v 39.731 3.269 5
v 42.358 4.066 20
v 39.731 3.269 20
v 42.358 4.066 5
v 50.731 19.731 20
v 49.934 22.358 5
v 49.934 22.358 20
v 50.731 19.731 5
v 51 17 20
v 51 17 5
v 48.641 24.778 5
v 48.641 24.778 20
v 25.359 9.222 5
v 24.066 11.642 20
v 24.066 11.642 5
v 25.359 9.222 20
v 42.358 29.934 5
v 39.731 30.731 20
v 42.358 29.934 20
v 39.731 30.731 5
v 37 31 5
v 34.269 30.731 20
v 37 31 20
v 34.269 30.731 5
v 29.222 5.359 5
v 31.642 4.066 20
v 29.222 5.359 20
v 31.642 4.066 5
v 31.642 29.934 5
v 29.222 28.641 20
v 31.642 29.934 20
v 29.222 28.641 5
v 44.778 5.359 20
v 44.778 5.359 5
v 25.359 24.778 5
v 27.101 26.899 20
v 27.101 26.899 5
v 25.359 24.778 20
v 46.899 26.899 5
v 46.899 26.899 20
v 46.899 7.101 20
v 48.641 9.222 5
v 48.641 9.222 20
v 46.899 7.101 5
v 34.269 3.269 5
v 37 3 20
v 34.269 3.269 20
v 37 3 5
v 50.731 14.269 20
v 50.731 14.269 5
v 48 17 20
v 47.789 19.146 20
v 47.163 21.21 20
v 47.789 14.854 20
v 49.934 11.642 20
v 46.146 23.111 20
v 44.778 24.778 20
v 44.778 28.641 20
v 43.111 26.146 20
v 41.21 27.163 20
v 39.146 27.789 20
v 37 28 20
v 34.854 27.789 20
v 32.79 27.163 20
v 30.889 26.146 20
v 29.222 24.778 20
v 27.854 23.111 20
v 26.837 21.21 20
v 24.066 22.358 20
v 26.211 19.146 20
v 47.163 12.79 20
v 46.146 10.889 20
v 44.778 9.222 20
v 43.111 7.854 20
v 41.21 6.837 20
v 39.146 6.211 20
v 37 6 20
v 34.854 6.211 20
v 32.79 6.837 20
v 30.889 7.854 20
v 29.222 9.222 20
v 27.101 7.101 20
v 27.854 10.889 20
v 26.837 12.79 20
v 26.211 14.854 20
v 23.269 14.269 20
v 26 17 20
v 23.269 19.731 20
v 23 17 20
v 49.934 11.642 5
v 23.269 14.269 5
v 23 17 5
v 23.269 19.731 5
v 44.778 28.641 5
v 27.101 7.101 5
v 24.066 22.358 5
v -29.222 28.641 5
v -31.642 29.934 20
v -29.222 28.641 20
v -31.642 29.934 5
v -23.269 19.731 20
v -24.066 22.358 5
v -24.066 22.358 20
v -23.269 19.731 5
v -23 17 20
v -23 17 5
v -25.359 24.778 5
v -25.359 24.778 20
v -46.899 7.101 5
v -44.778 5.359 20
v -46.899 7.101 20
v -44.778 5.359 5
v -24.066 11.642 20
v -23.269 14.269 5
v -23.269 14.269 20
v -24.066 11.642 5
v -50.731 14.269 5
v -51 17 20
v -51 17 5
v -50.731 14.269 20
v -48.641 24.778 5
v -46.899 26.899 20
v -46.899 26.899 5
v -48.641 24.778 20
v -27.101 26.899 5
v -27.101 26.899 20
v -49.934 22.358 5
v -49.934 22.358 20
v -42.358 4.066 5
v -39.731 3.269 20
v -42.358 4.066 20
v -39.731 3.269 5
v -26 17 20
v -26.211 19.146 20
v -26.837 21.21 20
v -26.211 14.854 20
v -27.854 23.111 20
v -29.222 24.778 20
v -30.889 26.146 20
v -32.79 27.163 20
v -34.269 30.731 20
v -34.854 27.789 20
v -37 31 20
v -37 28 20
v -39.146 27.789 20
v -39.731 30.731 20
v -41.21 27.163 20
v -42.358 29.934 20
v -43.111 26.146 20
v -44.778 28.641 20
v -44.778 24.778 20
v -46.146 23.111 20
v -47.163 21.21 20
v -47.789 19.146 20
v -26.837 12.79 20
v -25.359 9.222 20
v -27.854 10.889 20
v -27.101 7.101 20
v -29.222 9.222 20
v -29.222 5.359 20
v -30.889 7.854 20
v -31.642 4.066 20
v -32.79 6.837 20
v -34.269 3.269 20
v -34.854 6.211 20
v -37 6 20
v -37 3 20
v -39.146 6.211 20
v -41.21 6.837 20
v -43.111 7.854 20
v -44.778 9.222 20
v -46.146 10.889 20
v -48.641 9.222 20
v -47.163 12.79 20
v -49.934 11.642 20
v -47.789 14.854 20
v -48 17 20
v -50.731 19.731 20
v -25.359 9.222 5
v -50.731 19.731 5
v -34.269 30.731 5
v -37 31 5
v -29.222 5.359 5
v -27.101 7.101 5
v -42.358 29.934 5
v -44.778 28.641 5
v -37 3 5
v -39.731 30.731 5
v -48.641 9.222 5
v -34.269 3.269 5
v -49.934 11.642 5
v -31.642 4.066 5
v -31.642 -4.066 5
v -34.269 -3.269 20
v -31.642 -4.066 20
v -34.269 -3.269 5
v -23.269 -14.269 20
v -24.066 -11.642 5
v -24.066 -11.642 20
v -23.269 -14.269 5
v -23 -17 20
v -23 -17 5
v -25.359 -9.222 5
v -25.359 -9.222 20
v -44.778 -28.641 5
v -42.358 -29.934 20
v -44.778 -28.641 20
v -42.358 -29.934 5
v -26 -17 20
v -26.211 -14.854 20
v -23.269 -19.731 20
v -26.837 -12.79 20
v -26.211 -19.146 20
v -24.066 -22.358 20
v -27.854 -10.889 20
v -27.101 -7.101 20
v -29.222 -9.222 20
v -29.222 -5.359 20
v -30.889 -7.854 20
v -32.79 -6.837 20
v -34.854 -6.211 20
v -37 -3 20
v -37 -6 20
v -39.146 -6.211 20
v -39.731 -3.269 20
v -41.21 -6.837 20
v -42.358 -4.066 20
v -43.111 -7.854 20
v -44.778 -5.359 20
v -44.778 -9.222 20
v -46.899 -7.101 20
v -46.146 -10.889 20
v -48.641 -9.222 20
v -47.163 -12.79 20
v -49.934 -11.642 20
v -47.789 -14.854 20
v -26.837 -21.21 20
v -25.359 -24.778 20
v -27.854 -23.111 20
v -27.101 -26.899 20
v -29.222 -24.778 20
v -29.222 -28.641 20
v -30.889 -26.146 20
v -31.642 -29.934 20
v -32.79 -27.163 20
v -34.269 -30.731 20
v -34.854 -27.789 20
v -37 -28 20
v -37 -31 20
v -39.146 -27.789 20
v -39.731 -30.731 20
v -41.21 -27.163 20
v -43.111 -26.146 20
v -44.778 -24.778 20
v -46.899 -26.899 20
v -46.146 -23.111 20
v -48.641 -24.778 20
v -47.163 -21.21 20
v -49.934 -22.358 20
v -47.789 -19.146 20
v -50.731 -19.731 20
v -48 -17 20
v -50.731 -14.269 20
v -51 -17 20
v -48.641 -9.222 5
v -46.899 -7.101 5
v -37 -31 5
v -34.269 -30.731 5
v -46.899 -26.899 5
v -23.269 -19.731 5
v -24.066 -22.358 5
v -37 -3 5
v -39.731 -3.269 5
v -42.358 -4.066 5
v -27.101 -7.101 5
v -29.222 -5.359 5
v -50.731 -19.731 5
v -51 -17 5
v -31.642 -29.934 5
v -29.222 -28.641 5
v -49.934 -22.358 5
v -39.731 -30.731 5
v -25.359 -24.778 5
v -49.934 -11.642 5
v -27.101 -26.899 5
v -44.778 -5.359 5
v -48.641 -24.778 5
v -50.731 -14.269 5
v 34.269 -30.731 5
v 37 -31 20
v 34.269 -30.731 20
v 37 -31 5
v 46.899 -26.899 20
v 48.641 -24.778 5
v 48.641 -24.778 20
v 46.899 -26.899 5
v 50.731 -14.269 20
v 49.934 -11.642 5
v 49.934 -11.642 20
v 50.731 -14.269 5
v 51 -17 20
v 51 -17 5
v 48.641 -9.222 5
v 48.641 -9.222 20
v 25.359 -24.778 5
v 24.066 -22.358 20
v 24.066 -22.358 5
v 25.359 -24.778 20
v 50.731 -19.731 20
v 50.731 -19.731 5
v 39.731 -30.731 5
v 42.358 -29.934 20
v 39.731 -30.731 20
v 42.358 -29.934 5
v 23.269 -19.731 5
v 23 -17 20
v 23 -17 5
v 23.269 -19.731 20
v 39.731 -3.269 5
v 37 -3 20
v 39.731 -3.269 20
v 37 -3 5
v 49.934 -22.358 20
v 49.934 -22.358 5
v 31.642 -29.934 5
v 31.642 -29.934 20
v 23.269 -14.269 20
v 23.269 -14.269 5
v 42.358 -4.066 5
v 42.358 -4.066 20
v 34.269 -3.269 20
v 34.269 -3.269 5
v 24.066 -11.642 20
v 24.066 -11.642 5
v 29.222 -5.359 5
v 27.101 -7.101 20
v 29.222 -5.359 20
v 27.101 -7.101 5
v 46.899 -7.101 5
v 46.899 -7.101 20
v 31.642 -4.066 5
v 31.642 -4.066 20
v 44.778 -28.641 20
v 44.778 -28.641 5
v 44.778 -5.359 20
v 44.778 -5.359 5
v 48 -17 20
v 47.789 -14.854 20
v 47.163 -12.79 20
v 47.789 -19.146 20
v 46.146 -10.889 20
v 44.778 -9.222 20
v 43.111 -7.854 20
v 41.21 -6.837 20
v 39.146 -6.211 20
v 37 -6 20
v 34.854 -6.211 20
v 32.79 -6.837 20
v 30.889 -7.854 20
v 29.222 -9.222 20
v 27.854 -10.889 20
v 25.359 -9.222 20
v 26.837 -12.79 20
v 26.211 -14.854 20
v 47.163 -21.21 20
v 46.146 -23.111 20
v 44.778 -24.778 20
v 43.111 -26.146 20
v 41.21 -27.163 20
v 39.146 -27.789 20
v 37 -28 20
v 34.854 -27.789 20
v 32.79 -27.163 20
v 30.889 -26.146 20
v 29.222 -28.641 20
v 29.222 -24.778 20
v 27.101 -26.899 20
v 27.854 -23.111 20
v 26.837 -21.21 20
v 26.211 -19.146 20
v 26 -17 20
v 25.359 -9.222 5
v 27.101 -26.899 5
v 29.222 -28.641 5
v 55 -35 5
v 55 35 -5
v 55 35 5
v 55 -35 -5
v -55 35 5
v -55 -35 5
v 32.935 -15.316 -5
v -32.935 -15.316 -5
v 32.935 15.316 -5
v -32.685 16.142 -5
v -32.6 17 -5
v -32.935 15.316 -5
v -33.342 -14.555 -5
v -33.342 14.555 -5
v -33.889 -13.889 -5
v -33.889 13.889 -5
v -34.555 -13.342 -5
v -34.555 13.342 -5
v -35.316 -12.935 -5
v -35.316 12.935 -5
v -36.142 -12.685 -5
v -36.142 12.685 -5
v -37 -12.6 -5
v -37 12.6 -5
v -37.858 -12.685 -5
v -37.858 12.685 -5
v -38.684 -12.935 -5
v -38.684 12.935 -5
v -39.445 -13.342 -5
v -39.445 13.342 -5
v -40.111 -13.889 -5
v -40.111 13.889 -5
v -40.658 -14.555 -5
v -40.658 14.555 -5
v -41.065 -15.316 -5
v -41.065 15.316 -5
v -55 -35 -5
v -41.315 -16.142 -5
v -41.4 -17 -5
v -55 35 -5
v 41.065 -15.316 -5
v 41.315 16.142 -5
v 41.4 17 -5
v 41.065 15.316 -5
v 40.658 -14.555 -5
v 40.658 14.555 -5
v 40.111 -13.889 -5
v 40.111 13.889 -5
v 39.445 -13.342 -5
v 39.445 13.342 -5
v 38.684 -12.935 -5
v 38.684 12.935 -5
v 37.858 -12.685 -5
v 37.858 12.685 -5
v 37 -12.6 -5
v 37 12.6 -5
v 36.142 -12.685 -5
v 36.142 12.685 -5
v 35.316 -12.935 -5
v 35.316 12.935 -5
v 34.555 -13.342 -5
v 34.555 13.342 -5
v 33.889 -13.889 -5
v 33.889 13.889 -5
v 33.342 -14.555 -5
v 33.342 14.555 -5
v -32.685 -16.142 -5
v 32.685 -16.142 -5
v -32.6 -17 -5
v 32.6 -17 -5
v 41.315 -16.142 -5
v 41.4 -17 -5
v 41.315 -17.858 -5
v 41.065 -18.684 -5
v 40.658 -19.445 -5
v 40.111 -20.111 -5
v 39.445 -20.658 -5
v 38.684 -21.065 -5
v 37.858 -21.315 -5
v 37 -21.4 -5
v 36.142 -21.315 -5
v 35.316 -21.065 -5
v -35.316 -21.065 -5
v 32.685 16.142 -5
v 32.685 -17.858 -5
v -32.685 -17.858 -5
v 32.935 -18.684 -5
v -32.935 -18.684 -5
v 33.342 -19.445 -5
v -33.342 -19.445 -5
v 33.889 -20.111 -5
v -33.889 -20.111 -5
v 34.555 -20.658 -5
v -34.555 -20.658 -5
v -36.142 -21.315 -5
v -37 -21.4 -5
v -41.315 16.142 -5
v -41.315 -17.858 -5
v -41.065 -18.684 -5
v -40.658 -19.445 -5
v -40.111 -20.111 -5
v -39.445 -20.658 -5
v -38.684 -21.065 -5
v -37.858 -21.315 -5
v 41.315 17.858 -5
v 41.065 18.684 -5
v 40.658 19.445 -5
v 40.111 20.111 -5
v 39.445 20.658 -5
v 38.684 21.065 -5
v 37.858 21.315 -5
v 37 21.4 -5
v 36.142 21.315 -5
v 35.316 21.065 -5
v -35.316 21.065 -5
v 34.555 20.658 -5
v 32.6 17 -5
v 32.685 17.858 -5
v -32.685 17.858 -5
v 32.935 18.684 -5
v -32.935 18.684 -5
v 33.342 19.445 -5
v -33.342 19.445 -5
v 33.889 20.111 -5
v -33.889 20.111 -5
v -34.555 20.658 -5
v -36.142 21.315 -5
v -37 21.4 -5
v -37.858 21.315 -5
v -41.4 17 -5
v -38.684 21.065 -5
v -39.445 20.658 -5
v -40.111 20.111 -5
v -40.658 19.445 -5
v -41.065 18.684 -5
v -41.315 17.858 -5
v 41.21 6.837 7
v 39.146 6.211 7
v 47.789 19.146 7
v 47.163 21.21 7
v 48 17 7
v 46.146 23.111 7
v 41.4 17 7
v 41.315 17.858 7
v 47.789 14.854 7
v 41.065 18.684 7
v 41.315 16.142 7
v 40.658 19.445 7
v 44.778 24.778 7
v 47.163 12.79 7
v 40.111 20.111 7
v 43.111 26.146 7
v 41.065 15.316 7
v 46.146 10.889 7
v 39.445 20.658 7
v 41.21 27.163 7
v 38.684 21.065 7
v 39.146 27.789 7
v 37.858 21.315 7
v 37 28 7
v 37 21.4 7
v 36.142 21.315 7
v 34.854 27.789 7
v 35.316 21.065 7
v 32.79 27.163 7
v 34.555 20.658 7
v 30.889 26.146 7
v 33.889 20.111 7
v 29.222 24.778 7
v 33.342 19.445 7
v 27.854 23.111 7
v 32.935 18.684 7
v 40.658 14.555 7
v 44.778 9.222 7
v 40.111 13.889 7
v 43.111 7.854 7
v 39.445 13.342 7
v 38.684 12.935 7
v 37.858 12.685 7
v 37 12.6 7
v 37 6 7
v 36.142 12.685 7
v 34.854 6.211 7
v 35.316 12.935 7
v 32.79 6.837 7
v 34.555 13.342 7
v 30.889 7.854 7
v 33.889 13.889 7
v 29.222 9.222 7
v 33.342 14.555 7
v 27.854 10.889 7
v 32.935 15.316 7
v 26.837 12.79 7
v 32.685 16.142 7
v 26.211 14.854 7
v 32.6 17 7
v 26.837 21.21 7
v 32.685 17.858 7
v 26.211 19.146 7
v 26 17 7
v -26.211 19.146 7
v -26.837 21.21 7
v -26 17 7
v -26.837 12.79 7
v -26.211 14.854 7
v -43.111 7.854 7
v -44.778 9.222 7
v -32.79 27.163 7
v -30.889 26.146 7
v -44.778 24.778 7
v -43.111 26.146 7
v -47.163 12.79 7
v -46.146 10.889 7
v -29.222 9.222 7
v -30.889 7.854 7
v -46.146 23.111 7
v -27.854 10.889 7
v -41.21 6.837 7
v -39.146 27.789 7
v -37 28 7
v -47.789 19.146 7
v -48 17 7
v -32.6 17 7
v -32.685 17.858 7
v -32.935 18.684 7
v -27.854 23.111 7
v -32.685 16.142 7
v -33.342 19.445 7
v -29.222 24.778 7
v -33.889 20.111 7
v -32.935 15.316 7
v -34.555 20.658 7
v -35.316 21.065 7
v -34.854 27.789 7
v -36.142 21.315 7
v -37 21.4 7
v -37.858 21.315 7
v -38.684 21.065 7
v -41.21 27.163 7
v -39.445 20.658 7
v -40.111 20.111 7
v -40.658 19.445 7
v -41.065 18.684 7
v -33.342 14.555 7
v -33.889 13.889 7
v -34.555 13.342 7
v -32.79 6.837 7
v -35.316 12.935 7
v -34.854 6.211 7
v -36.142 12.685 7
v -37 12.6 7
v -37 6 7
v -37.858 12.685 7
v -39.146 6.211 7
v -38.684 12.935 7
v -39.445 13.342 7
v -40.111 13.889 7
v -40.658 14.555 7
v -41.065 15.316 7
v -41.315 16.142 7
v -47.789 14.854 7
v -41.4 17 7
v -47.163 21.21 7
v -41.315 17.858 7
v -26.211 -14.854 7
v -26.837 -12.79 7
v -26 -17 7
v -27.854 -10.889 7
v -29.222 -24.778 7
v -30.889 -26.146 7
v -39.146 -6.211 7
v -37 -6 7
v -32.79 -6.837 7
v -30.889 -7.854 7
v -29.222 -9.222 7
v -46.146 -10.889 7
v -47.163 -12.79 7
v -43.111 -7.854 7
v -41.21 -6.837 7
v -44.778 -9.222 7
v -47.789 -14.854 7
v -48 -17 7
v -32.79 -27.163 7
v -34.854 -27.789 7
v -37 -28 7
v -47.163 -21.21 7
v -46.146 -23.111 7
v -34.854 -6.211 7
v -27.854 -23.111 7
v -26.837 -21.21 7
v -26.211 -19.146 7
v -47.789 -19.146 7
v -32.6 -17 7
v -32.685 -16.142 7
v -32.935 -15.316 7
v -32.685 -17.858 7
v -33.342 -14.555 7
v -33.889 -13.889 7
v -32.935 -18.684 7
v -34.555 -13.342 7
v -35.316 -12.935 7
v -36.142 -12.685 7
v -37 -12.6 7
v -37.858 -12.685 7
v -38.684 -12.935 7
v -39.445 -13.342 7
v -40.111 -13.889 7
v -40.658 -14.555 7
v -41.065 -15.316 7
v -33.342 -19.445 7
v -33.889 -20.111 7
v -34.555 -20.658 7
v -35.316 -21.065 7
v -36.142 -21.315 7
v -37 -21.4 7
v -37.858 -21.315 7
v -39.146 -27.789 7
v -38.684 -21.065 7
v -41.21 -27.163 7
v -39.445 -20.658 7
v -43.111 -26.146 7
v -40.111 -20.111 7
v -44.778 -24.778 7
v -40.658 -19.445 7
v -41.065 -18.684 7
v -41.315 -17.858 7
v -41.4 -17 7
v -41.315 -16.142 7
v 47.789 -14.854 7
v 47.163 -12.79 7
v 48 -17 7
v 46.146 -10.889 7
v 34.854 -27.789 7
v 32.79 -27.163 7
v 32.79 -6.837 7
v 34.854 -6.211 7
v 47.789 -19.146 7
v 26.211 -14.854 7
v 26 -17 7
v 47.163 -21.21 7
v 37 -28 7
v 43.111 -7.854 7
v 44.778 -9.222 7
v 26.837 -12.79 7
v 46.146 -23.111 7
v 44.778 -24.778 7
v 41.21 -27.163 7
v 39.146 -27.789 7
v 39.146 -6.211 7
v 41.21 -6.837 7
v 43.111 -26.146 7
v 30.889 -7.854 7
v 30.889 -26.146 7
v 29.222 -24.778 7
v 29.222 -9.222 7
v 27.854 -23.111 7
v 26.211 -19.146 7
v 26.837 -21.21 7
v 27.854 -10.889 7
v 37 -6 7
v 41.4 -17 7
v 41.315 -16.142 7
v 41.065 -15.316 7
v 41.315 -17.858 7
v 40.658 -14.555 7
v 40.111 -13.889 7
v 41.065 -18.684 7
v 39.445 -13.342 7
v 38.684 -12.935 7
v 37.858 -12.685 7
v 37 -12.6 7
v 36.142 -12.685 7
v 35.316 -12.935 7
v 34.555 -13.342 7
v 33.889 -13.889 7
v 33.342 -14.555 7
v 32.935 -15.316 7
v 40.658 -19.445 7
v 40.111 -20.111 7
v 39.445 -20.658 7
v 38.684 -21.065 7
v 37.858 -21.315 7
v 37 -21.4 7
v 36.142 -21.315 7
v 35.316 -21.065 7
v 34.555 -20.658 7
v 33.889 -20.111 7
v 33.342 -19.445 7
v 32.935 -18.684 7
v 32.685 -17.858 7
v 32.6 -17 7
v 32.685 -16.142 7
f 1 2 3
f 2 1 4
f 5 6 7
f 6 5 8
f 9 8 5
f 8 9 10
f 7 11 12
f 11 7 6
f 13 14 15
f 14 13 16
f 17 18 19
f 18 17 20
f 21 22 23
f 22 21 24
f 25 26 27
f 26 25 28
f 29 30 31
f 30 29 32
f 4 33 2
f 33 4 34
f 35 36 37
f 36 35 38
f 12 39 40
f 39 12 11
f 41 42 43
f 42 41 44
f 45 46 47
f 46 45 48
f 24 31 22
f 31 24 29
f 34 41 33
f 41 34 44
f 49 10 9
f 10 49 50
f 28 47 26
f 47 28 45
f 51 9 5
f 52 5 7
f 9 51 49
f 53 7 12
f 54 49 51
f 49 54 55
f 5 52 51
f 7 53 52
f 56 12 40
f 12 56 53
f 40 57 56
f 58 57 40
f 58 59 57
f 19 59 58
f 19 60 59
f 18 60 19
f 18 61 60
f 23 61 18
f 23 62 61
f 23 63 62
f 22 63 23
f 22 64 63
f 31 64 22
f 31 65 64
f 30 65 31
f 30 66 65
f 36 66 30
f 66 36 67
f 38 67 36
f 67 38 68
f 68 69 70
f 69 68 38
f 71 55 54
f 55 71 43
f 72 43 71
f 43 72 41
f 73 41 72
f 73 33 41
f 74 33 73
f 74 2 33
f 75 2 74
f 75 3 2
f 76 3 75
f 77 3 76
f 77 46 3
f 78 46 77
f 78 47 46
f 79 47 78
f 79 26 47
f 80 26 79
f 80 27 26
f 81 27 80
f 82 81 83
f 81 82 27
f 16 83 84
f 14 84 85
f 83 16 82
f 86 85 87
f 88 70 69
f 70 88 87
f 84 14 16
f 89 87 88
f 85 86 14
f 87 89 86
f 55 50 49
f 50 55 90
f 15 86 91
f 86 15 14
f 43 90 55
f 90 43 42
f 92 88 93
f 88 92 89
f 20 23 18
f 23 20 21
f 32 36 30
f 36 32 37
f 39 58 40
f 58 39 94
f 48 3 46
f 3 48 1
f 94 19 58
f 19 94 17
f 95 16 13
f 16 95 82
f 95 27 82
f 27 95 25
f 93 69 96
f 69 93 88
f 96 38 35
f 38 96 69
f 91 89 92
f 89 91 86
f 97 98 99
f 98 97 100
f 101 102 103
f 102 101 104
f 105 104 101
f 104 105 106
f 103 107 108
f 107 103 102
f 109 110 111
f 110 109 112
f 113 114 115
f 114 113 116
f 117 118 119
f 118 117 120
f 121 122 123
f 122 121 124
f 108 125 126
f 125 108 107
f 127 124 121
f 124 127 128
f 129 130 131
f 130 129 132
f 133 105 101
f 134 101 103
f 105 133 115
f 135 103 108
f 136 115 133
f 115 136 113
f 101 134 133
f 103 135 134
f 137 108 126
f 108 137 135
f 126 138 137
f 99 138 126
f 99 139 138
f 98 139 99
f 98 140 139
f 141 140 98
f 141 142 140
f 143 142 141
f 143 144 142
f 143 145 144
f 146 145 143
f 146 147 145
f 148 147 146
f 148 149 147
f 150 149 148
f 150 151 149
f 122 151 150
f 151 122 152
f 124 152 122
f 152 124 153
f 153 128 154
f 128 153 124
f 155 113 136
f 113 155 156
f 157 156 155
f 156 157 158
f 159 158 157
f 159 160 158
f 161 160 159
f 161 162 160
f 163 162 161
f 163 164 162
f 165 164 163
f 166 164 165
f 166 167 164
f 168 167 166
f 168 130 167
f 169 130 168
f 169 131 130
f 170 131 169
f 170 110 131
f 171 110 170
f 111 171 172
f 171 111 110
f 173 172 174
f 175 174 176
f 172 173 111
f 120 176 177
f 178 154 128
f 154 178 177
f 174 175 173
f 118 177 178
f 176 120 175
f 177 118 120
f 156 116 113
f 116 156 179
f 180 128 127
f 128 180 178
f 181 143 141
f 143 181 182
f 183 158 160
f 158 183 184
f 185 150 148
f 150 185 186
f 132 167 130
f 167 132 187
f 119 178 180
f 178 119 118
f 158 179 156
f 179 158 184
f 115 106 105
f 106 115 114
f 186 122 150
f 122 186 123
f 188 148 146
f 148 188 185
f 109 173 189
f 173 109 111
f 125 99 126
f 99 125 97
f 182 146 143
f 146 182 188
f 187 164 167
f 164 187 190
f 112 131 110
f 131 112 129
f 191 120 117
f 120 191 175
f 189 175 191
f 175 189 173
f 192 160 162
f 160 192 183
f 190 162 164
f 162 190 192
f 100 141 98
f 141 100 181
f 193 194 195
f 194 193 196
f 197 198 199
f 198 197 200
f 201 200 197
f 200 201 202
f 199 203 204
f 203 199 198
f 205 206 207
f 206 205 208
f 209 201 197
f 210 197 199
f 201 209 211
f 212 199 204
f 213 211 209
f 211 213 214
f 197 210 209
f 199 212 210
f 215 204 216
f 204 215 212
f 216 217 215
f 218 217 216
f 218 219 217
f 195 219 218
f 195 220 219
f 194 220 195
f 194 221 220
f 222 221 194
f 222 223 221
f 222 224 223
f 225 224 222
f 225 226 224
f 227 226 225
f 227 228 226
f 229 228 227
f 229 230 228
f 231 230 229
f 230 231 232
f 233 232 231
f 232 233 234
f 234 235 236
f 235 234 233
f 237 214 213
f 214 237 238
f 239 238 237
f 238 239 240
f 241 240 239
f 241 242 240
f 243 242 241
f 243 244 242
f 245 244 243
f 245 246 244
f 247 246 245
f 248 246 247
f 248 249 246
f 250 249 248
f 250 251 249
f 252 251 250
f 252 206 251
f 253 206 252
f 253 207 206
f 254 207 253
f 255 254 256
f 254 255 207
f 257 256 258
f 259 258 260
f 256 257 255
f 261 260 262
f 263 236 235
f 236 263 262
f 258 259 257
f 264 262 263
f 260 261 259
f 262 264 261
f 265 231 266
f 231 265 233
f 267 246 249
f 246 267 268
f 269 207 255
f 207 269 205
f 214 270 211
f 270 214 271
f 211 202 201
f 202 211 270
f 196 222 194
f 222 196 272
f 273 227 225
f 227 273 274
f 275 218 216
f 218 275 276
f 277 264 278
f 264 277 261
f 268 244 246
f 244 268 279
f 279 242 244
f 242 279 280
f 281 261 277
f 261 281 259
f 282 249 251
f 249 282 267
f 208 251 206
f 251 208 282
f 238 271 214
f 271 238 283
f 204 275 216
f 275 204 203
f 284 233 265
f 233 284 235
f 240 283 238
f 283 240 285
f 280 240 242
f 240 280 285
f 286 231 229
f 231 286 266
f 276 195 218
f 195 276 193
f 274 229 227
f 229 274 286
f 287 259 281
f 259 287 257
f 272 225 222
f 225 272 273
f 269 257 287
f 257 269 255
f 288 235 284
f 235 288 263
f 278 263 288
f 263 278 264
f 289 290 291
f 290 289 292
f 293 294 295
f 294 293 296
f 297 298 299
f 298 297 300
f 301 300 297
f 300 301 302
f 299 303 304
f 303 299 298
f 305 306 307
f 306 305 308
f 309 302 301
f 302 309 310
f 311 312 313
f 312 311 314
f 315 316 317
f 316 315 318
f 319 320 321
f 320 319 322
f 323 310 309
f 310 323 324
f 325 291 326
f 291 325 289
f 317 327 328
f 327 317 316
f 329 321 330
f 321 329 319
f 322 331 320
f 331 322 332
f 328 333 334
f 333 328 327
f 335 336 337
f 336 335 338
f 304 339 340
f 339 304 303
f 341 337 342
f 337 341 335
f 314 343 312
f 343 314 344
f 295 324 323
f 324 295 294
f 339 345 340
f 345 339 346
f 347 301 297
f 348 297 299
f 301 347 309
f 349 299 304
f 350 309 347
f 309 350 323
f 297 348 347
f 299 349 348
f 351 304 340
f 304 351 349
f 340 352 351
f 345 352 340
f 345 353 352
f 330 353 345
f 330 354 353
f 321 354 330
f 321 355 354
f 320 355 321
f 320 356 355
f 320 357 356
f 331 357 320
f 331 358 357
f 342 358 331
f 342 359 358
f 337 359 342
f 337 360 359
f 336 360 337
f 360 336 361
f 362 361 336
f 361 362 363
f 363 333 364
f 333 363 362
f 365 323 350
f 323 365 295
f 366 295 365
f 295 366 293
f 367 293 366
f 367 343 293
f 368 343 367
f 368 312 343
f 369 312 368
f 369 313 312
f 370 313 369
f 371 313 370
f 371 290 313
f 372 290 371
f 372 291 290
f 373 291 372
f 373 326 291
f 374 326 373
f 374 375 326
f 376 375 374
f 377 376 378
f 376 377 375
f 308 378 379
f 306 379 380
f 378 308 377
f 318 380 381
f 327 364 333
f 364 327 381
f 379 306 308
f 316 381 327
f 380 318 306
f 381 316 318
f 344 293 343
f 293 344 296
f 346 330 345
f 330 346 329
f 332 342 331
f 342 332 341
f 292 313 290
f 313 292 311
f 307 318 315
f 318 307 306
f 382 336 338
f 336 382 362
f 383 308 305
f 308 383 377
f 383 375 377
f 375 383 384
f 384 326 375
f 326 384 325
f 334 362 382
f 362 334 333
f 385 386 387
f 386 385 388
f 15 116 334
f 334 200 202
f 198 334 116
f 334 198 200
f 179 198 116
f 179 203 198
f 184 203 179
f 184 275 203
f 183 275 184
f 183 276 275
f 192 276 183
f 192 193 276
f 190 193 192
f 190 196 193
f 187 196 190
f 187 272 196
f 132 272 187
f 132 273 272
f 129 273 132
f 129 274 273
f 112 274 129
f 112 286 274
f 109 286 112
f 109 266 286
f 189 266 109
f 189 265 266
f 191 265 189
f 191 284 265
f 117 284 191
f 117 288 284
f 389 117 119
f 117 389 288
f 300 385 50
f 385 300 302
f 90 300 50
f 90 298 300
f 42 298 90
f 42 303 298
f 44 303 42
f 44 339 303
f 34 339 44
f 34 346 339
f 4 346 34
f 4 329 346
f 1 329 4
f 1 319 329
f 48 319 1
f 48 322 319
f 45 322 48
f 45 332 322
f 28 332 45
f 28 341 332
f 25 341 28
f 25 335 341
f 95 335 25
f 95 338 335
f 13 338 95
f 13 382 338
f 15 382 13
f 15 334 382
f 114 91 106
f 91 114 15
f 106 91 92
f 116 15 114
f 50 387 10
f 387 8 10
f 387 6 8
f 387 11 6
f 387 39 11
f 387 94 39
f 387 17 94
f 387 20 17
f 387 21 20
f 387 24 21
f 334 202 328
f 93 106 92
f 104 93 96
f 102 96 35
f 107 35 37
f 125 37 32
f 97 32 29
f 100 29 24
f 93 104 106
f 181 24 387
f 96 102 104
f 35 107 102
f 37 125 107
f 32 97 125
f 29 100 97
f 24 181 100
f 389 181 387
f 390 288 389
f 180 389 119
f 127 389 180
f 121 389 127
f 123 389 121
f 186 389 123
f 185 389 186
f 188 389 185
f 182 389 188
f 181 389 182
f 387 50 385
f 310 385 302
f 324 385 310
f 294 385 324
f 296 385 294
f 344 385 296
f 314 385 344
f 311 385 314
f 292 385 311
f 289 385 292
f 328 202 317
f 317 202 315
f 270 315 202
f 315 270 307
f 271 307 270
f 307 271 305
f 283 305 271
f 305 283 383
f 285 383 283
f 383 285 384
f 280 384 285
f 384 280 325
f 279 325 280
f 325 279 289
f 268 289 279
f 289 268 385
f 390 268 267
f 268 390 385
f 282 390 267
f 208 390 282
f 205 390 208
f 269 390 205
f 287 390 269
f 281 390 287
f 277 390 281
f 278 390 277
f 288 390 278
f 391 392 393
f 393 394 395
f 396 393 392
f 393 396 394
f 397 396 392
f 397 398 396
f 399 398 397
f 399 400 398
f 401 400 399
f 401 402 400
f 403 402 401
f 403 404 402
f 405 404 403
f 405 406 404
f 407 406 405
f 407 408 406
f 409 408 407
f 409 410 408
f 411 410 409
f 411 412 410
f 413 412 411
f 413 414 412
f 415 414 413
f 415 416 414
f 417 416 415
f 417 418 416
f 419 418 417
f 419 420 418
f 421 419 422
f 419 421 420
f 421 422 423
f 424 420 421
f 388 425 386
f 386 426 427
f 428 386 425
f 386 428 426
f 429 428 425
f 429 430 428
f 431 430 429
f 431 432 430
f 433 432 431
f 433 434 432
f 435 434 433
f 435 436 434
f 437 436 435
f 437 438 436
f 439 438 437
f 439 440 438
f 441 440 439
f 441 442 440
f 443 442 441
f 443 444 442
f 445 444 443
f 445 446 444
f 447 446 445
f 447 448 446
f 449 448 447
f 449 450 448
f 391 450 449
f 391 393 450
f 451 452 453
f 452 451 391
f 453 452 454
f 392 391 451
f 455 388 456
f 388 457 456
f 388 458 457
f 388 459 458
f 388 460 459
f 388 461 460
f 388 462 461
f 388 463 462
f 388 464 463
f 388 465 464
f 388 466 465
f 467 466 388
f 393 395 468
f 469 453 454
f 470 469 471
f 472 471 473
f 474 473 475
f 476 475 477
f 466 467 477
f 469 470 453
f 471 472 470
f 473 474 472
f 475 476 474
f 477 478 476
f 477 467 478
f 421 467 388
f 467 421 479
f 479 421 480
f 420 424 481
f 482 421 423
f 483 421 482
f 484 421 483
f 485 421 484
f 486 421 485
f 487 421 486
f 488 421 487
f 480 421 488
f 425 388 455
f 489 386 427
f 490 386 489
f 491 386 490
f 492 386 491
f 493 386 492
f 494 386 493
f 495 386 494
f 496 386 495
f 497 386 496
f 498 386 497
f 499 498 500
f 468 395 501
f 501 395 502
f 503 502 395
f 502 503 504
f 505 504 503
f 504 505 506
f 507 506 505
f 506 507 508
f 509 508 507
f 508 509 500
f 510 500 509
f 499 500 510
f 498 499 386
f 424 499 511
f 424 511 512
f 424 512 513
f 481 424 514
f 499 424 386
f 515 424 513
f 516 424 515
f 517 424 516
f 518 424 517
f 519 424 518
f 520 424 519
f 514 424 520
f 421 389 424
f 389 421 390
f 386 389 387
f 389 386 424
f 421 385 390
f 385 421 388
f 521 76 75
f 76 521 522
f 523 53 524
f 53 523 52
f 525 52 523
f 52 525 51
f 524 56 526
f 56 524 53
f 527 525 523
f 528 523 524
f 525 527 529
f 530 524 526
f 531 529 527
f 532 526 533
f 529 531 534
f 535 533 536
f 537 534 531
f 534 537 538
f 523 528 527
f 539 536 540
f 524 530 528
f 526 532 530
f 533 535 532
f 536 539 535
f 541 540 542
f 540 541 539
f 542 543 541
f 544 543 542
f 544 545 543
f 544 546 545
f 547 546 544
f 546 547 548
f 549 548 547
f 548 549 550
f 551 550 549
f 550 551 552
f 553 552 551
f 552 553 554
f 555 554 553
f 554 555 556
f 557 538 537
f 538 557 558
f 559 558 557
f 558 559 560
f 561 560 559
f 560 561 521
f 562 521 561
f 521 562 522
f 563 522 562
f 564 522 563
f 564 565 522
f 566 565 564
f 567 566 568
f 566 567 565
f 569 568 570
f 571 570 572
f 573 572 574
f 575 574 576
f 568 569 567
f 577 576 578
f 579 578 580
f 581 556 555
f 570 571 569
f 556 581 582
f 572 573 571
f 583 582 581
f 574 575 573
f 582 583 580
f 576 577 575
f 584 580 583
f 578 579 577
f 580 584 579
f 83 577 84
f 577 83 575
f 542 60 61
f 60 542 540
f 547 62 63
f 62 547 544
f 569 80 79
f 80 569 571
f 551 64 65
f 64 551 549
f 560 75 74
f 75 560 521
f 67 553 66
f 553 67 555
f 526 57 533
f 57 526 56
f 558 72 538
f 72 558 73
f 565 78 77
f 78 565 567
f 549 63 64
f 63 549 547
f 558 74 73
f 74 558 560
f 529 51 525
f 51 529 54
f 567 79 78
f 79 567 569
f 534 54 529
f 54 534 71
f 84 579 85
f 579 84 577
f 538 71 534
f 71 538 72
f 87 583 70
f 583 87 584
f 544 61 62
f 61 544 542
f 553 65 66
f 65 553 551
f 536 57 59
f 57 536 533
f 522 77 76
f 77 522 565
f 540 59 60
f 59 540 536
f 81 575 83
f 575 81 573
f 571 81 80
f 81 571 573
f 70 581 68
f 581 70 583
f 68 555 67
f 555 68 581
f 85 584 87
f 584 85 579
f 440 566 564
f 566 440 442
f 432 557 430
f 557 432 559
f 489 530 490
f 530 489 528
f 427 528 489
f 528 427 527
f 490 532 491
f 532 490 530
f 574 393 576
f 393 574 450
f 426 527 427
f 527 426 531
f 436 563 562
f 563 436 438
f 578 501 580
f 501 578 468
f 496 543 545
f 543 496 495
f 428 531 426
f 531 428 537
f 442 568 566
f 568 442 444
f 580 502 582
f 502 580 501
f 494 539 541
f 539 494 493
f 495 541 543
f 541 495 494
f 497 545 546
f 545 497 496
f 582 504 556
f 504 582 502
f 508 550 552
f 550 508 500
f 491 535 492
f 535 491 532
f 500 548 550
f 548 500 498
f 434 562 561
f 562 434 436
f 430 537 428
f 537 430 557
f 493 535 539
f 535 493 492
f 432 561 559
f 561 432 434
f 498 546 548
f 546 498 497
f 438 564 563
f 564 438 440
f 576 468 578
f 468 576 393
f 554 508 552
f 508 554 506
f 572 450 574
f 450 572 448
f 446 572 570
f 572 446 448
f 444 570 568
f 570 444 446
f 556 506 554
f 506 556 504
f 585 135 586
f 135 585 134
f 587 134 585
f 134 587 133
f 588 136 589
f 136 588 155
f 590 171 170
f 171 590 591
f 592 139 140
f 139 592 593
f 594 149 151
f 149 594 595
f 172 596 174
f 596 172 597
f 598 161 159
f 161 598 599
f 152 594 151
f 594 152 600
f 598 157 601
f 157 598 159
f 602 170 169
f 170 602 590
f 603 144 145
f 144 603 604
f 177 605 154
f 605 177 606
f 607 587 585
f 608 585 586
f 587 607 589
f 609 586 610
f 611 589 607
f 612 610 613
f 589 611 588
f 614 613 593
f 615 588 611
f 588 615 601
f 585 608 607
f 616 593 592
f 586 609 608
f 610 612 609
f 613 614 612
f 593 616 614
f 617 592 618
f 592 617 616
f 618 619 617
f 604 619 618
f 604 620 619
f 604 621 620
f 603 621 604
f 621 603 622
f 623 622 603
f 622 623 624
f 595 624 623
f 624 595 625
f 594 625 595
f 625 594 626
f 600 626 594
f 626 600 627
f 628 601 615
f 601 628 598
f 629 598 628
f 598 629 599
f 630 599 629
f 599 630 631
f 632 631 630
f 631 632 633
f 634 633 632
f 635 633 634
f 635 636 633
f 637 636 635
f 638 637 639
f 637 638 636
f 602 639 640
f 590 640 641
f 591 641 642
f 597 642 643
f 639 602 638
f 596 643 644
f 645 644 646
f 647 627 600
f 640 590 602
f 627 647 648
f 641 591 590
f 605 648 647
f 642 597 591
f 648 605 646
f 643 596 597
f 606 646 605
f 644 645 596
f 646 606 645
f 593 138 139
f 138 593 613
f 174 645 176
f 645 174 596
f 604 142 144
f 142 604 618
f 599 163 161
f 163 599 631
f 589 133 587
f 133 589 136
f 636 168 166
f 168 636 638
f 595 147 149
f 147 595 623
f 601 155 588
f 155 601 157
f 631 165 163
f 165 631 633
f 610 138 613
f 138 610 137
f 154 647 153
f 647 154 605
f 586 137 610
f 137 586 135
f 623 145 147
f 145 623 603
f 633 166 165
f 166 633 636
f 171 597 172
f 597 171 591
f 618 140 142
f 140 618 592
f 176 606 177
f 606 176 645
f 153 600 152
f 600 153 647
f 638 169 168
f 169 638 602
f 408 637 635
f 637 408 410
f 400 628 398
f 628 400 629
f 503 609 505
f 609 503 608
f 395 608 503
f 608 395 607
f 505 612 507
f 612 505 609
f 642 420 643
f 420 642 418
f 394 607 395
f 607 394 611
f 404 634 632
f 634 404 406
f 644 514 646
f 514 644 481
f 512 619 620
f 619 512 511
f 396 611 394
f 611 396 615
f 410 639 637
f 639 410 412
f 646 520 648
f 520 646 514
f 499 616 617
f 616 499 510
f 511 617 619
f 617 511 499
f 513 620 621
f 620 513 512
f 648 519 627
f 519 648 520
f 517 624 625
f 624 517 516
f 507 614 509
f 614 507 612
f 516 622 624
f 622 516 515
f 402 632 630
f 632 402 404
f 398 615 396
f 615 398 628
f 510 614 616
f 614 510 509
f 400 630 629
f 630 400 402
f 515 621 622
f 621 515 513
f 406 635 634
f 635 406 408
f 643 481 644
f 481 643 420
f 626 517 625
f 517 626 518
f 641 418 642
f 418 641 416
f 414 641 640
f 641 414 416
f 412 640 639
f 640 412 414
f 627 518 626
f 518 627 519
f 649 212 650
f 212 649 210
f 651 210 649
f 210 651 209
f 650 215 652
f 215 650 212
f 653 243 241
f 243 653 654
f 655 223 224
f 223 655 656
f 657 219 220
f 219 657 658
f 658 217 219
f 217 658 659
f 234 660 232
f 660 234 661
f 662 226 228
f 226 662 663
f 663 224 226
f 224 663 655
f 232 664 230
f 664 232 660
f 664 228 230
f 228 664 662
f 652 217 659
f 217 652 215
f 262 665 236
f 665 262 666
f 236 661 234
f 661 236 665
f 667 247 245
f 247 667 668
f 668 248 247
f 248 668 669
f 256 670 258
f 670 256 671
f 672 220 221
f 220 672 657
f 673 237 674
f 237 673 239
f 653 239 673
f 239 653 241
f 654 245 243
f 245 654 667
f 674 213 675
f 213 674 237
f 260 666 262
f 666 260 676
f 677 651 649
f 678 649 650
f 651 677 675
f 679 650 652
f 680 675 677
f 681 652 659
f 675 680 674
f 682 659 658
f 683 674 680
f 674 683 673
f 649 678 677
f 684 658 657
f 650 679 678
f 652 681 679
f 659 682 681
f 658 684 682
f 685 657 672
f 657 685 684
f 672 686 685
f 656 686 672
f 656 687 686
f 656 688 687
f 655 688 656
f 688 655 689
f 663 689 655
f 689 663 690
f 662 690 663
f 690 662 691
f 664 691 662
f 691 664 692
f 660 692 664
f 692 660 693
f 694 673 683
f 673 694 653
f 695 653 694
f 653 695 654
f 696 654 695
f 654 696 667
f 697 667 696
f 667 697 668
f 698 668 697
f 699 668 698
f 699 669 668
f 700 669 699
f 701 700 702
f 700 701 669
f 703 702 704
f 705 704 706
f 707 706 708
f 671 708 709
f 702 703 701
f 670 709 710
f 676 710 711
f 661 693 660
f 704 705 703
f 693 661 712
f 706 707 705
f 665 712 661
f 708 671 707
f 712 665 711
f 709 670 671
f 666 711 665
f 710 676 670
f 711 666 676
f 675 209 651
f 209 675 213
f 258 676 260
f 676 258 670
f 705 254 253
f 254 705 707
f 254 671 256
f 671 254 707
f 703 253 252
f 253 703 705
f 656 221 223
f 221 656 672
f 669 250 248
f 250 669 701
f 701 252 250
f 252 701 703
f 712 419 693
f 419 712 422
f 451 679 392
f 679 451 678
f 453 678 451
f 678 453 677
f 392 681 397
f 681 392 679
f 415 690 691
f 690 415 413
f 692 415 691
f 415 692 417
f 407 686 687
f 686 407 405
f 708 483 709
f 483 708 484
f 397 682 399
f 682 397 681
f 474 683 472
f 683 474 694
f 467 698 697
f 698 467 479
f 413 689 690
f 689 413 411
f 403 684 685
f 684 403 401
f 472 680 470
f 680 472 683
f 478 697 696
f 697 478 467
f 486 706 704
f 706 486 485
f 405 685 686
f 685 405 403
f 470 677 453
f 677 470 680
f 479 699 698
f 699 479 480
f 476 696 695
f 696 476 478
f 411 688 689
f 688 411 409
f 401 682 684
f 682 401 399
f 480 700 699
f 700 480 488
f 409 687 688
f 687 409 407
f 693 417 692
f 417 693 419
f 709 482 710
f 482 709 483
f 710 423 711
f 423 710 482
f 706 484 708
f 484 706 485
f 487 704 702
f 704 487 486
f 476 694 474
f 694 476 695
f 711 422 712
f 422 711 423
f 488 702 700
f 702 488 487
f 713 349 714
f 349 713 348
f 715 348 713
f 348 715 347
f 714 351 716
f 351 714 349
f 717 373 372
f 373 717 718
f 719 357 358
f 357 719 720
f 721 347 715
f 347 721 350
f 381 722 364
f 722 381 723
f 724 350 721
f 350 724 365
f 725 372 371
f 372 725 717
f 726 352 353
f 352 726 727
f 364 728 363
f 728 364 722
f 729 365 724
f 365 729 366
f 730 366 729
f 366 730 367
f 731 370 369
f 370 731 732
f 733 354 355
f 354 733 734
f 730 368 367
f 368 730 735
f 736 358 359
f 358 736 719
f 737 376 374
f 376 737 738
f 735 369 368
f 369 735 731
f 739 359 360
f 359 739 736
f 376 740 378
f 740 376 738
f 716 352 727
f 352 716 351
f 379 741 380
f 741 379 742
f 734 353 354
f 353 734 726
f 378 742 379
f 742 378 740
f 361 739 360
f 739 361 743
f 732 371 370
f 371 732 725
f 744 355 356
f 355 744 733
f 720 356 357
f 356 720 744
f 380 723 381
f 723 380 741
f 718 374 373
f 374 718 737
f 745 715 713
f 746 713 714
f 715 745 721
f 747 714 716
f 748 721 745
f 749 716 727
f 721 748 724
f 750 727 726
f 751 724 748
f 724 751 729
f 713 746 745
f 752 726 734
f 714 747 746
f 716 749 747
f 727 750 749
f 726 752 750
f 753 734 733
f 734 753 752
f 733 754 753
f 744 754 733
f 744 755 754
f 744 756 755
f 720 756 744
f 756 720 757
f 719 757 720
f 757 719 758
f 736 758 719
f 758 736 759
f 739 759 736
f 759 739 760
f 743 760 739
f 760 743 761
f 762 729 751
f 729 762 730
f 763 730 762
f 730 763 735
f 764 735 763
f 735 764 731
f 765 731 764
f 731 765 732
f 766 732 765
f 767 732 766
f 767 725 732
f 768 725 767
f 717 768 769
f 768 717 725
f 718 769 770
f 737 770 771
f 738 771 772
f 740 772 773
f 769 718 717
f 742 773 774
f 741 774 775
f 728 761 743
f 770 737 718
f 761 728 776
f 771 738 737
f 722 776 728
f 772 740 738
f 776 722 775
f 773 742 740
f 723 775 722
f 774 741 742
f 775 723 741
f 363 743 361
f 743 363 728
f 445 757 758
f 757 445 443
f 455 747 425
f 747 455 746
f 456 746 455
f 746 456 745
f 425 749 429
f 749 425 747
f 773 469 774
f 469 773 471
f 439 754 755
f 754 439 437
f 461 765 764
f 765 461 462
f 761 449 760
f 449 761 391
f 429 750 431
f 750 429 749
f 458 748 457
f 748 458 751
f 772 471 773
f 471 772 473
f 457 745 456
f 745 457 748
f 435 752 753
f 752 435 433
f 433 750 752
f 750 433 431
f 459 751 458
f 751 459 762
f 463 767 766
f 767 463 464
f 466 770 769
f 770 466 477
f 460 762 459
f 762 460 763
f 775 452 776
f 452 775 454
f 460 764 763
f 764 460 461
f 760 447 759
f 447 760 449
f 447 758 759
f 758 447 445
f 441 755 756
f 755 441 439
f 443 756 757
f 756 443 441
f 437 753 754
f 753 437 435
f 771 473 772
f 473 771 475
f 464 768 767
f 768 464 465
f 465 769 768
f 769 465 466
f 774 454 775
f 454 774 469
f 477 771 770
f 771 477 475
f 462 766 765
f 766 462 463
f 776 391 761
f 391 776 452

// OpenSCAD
$fn = 32;

// ----------------------------------------------------------------------
// Socket pad plate
// bosses with counterbored sockets for the screws
// ----------------------------------------------------------------------

// --- parameters (mm) ---
base_t = 10;            // base plate thickness
boss_h = 15;            // boss height above the base plate
boss_d = 28;            // boss diameter
socket_d = 22;          // socket diameter
socket_depth = 13;      // socket depth from the boss face
bolt_d = 8.8;           // screw clearance hole through the socket floor
plate = [110, 70, 10];  // overall size (x, y, z)
edge = 18;              // boss centre offset from the plate edge
pads = 4;               // boss count, one per corner

// --- derived feature positions (mm) ---
height = base_t + boss_h;        // = 25   overall height of the part
corner_x = plate[0] / 2 - edge;  // = 37   boss centre X
corner_y = plate[1] / 2 - edge;  // = 17   boss centre Y
feature_centers = [
  [corner_x, corner_y],
  [-corner_x, corner_y],
  [-corner_x, -corner_y],
  [corner_x, -corner_y]
];   // boss centres: sockets, holes and the pads themselves are placed from here

// base plate, bosses on feature_centers, socket + through hole in each
difference() {
  union() {
    cube(plate, center = true);
    for (centre = feature_centers)
      translate([centre[0], centre[1], plate[2] / 2 - 1])
        cylinder(d = boss_d, h = boss_h + 1);
  }
  for (centre = feature_centers) {
    translate([centre[0], centre[1], plate[2] / 2 + boss_h - socket_depth])
      cylinder(d = socket_d, h = socket_depth + 1);
    translate([centre[0], centre[1], -height])
      cylinder(d = bolt_d, h = 2 * height + 2);  // through the socket floor
  }
}
